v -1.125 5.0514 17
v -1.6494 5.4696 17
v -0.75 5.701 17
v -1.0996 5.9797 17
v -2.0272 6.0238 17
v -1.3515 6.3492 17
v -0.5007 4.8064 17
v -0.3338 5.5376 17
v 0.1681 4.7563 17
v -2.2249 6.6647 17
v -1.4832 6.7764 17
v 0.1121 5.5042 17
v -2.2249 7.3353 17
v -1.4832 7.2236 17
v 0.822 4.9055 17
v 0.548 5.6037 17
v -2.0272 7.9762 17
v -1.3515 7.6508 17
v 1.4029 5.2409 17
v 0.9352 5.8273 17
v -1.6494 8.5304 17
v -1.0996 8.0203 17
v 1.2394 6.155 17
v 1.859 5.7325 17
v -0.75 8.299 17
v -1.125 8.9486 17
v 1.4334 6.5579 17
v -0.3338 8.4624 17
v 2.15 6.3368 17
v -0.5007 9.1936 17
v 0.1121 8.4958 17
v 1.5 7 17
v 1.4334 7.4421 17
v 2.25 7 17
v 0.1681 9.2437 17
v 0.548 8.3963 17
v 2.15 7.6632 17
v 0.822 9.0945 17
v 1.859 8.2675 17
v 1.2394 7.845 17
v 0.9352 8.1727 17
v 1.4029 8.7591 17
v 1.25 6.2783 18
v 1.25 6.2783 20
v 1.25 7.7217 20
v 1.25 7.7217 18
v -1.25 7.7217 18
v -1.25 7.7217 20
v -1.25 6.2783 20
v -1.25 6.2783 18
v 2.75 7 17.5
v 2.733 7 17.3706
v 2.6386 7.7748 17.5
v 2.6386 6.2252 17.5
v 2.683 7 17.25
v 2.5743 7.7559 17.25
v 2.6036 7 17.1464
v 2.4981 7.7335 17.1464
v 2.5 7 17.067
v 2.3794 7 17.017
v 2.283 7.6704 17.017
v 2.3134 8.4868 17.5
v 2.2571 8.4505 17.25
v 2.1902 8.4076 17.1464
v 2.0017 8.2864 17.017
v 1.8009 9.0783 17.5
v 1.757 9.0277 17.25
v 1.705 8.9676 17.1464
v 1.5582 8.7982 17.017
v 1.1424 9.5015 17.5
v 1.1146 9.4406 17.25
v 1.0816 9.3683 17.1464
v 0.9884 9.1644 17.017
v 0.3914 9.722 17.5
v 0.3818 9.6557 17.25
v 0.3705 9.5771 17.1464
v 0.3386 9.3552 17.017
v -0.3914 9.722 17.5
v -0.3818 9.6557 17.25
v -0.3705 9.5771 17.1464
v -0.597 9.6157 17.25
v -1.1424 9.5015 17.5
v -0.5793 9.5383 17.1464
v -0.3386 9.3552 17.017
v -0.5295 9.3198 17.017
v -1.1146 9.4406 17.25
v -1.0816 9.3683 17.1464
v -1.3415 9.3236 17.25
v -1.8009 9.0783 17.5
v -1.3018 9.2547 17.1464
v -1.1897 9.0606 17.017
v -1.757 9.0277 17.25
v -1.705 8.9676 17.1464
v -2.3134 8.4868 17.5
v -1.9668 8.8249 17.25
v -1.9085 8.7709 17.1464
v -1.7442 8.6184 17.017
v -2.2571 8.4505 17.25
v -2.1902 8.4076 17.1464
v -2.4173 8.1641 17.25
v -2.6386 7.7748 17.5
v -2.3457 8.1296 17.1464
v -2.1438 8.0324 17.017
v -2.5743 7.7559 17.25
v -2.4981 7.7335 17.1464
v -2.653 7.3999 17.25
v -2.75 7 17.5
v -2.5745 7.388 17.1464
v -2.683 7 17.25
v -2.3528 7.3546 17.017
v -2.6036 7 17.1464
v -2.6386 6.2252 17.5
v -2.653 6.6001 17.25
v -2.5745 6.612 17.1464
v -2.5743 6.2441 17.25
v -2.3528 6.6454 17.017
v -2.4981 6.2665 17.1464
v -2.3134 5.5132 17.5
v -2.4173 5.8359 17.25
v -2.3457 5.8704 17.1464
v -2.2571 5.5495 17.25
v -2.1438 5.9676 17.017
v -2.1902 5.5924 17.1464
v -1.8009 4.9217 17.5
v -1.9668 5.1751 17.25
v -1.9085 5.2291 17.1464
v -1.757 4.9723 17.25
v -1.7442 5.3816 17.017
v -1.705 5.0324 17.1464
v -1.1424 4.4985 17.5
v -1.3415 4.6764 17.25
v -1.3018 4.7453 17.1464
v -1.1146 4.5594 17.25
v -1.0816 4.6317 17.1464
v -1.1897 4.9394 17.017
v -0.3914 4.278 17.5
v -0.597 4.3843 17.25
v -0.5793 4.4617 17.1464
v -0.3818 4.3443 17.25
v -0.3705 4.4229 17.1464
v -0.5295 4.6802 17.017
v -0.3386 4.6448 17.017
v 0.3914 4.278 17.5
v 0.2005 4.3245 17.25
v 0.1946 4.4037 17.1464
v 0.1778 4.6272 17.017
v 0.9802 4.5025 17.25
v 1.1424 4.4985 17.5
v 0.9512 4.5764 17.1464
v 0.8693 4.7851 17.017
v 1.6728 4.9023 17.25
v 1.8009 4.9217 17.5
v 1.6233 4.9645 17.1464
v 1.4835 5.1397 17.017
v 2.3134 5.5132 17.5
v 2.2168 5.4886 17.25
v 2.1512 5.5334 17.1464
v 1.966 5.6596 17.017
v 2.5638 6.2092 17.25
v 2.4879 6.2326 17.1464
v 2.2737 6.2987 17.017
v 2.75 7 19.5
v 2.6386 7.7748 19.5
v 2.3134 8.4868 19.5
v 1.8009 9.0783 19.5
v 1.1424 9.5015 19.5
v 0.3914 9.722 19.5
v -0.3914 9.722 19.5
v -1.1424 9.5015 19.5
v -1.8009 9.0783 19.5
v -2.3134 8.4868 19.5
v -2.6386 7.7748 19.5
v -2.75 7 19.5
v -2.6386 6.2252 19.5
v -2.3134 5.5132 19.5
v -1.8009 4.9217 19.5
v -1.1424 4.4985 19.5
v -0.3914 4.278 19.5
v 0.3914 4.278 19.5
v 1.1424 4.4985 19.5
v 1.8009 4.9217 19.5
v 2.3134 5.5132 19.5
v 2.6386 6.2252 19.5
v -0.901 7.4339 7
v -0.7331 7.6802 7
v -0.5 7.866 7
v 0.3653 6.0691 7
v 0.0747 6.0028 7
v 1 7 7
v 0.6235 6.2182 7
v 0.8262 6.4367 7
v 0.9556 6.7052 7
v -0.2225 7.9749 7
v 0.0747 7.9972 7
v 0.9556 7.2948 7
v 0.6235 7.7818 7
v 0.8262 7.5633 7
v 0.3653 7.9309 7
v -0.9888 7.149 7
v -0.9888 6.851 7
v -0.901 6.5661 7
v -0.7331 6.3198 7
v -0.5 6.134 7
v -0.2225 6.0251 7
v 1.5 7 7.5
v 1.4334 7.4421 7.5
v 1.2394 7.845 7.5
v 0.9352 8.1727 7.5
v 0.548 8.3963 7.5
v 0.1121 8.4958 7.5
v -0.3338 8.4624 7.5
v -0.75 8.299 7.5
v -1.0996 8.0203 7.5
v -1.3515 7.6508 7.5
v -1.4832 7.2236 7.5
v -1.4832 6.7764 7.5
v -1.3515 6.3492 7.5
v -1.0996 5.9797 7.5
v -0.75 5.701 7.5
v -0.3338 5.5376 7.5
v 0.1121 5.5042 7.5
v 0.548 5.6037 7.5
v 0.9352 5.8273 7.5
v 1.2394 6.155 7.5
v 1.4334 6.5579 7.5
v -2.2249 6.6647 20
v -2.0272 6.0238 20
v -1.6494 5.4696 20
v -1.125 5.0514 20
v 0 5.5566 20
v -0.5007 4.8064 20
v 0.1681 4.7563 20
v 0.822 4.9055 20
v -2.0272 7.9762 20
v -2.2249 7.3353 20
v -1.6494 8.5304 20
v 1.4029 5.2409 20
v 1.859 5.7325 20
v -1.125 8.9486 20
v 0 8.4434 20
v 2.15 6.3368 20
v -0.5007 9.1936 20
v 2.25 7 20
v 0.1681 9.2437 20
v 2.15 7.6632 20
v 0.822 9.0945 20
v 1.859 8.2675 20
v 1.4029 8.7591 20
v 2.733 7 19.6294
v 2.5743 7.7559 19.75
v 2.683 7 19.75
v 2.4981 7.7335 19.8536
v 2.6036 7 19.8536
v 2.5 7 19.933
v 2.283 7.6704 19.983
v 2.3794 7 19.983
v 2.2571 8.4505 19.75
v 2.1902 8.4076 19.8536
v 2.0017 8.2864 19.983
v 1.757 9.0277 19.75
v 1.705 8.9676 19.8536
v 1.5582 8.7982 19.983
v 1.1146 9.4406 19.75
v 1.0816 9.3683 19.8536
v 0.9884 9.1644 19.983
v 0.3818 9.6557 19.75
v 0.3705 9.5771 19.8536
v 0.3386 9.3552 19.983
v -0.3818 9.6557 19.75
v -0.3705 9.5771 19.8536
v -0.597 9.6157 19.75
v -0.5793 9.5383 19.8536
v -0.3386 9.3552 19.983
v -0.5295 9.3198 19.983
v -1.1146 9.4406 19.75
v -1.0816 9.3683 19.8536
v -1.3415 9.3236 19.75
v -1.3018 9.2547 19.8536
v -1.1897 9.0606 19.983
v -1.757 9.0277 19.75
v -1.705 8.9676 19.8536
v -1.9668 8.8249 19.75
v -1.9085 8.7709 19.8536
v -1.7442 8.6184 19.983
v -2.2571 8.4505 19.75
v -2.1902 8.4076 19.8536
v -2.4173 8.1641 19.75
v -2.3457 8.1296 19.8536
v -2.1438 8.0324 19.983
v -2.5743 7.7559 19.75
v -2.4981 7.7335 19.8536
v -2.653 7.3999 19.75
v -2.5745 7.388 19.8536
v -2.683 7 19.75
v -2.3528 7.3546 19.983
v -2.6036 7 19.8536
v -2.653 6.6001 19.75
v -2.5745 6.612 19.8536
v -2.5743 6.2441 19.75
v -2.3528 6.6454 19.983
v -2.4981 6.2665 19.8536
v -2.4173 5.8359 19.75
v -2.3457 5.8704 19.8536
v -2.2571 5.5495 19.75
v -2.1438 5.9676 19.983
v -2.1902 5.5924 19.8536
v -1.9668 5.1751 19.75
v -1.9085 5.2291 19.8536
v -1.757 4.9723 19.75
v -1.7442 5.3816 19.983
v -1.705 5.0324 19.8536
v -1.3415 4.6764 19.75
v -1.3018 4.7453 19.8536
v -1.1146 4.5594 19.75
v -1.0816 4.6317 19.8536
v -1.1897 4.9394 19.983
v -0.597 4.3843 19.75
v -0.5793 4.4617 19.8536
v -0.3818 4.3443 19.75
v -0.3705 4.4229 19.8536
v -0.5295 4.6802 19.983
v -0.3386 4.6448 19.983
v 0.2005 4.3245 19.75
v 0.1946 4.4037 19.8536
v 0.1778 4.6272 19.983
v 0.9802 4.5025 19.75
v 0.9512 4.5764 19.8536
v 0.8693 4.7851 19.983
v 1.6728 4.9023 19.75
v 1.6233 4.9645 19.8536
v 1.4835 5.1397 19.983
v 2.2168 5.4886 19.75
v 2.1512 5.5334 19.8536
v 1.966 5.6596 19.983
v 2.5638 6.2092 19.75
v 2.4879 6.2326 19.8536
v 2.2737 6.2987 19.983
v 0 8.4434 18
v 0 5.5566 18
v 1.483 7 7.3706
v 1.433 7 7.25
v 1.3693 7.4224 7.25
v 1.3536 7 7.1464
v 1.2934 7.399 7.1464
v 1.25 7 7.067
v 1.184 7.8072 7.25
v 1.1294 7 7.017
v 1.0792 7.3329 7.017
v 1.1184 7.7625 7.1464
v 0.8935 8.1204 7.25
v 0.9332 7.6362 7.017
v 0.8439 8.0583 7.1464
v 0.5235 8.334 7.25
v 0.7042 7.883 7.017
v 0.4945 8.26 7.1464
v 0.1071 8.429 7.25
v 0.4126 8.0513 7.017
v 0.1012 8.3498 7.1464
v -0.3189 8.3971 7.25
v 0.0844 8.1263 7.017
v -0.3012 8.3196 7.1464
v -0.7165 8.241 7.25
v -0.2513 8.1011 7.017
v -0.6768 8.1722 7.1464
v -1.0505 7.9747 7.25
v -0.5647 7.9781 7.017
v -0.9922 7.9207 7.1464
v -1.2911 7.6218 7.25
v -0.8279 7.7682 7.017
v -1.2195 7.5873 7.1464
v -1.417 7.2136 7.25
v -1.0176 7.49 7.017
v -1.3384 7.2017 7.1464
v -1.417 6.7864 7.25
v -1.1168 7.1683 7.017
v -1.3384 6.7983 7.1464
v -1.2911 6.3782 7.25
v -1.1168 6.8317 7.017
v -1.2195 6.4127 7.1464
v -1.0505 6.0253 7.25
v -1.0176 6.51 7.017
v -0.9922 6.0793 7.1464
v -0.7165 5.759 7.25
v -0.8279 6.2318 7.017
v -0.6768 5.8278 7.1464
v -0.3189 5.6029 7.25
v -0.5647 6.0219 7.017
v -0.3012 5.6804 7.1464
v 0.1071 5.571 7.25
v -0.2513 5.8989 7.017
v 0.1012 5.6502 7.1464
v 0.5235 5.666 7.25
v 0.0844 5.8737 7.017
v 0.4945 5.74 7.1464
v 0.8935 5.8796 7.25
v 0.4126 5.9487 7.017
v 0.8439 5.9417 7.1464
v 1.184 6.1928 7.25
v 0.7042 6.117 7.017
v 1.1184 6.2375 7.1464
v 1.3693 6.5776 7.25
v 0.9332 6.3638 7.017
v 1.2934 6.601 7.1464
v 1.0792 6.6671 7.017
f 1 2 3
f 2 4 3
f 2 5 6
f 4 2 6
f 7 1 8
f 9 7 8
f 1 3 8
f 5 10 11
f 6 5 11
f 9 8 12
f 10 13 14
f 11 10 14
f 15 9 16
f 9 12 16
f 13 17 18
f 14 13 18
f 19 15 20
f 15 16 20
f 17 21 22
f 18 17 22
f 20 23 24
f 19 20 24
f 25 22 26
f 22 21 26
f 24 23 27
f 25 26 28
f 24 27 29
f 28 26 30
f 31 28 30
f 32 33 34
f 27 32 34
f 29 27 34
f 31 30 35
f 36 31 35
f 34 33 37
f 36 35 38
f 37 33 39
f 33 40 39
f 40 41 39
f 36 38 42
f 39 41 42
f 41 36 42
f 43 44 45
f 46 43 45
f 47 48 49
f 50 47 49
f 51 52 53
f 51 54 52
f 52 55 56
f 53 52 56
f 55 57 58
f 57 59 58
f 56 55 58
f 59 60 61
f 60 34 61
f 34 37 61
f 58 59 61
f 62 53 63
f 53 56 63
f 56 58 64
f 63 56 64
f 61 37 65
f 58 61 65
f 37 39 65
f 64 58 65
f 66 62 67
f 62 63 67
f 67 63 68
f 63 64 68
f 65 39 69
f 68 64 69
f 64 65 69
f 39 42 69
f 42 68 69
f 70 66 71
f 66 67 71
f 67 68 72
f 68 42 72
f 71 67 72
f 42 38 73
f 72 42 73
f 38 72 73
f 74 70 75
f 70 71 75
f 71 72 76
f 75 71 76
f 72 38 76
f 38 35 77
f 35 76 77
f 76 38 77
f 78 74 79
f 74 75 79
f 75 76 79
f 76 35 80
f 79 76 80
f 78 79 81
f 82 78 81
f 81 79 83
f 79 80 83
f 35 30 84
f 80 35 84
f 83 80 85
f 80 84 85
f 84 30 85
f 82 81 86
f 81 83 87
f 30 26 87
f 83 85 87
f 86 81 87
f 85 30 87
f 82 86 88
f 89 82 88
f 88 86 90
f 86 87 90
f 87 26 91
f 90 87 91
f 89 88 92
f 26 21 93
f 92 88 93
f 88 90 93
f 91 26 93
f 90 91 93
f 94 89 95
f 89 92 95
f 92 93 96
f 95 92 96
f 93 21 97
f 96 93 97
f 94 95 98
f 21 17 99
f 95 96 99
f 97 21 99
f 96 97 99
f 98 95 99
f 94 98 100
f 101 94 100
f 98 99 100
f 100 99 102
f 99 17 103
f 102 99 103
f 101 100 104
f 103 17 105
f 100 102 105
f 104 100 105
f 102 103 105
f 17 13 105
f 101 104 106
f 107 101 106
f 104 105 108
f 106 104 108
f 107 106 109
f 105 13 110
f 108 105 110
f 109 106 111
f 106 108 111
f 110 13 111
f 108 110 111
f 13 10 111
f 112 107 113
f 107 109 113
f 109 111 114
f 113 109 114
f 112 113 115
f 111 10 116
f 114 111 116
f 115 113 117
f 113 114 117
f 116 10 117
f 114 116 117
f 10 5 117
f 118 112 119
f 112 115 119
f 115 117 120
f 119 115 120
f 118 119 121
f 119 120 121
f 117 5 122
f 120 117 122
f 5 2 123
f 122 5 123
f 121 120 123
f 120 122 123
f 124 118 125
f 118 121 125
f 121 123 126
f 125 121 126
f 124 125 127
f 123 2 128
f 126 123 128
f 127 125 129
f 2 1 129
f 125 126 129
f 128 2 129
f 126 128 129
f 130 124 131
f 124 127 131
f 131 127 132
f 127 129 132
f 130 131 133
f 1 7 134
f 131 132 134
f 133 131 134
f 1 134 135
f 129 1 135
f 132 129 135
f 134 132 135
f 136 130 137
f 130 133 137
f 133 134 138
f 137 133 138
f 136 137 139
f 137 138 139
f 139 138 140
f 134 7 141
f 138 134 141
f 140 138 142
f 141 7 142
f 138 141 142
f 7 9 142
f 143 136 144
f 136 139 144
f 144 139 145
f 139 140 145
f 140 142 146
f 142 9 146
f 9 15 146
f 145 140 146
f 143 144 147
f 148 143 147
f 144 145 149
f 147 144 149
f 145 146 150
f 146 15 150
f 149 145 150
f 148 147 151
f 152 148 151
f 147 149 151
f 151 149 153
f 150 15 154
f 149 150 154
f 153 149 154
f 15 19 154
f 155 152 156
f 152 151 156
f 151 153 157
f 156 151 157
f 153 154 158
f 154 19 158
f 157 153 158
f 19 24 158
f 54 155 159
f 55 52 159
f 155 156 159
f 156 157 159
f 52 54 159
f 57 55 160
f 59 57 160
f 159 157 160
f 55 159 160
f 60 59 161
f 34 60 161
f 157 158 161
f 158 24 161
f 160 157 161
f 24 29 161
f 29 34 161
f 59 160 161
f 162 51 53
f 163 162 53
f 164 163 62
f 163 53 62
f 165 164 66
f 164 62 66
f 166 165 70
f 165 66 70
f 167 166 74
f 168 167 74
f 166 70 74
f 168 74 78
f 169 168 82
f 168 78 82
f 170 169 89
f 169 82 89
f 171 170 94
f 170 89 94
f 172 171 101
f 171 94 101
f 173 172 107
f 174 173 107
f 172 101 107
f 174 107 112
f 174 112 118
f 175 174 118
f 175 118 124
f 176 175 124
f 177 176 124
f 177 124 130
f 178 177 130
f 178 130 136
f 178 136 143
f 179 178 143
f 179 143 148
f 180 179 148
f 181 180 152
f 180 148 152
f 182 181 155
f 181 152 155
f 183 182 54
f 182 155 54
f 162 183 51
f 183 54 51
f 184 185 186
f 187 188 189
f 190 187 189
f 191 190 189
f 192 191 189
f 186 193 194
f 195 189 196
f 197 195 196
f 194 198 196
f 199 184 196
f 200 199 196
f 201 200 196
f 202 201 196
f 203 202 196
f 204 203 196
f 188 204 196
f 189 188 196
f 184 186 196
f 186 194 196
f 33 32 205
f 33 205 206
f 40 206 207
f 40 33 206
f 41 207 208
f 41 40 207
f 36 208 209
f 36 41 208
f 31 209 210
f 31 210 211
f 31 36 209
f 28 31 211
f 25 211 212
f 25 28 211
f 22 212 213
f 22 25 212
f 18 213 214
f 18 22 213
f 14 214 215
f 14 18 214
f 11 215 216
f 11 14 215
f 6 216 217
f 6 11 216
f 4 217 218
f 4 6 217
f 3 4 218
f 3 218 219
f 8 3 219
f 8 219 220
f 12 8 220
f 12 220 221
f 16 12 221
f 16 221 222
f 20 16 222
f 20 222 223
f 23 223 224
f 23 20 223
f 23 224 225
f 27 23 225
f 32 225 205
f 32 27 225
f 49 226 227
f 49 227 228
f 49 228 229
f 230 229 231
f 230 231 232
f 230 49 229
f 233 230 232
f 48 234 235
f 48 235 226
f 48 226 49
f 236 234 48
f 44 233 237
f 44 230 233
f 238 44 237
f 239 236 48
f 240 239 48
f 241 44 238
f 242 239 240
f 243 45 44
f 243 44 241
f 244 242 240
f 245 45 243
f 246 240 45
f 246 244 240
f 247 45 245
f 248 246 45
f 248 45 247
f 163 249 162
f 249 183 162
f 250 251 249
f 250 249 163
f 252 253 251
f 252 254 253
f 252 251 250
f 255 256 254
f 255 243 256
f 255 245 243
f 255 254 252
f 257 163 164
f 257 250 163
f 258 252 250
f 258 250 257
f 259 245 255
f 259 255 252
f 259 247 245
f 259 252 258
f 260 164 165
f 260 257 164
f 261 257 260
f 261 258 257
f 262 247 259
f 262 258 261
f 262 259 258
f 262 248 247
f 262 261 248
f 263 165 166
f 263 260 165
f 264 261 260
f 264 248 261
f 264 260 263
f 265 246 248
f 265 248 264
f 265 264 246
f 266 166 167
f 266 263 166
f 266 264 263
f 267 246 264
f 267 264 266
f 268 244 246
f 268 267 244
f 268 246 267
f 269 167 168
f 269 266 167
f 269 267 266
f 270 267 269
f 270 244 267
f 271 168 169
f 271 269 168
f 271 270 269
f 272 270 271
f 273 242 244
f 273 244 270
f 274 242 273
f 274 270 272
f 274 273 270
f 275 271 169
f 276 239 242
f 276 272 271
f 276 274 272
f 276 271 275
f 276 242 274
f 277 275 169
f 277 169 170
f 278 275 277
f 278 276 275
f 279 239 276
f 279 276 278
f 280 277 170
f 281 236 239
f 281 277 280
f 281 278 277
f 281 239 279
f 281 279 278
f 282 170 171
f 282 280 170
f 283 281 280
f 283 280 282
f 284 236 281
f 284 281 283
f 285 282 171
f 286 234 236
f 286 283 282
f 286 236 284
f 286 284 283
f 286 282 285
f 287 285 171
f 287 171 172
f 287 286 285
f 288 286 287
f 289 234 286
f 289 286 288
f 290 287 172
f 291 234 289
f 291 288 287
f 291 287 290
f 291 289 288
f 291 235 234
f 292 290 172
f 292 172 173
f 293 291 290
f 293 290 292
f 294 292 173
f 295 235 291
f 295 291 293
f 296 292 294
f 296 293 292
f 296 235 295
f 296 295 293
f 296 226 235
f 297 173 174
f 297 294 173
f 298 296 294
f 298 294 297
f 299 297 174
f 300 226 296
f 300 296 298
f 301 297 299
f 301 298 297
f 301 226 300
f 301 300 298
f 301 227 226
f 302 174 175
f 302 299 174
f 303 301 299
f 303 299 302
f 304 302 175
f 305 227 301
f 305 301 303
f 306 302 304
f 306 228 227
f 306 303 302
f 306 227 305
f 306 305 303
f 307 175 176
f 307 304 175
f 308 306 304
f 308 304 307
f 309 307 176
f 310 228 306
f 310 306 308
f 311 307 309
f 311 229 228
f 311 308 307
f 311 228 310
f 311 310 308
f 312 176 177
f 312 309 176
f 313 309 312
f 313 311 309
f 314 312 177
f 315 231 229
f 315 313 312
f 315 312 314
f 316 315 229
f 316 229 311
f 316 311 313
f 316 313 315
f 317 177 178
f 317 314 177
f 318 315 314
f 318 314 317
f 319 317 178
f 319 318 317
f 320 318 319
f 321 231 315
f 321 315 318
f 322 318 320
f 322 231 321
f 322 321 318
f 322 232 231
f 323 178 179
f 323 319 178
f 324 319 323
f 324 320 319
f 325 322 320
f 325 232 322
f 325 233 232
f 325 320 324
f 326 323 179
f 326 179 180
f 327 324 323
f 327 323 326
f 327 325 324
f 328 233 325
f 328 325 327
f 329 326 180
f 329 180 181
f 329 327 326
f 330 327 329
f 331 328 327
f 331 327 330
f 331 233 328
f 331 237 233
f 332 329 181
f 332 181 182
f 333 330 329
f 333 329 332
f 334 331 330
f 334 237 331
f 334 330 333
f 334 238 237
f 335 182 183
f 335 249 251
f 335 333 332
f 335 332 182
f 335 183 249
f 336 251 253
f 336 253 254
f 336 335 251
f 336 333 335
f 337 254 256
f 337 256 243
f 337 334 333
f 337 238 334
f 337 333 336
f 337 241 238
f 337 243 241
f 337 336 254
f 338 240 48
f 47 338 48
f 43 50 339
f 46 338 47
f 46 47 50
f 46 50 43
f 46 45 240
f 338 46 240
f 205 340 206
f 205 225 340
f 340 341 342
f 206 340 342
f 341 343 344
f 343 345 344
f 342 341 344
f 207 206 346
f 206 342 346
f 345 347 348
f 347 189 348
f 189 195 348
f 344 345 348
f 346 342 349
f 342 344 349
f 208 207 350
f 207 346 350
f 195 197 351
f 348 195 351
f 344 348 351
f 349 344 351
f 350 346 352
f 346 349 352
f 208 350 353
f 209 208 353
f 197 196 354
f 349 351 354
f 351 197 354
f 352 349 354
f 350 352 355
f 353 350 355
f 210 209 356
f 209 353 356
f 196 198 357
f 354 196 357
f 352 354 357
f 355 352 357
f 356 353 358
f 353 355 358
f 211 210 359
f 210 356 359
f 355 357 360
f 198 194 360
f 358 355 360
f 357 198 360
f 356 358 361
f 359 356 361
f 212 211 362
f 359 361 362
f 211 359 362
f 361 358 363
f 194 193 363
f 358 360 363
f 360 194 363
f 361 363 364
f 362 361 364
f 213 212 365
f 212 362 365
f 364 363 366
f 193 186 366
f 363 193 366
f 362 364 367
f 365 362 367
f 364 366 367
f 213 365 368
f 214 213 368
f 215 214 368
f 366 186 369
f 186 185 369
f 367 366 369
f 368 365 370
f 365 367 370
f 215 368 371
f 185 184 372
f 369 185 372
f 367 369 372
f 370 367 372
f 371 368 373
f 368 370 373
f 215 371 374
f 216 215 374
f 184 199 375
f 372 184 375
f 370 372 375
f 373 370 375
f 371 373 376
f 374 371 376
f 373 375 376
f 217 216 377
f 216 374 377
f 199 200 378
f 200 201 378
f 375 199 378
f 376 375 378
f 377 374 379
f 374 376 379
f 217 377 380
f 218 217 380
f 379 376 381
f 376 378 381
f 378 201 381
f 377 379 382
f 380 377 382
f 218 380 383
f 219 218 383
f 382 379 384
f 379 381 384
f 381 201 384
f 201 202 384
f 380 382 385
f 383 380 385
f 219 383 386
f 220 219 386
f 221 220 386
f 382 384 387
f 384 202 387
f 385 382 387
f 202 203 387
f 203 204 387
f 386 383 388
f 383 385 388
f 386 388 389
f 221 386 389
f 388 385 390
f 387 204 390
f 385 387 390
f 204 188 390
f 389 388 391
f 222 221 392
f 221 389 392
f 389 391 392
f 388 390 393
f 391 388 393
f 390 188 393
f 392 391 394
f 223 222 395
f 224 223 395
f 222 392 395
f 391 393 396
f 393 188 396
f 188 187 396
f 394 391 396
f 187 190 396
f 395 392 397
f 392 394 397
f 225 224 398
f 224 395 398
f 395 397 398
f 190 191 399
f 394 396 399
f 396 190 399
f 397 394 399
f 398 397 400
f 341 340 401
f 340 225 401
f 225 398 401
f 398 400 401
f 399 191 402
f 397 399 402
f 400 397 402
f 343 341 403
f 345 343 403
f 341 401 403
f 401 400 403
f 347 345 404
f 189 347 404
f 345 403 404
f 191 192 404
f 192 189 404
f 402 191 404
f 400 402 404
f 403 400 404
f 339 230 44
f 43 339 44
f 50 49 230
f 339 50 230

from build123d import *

# Parameters (mm, degrees)
SKETCH011_R     = 2.75
PAD006_DEPTH    = 3
POCKET004_DEPTH = 2
SKETCH013_R     = 1.5
PAD007_DEPTH    = 10
FILLET003_R     = 0.5


with BuildPart() as part:
    # Sketch011 → Pad006 (new body)
    with BuildSketch(Plane.XY):
        Circle(SKETCH011_R)
    extrude(amount=PAD006_DEPTH)

    # Sketch012 (on Face3 of Pad006) → Pocket004 (cut)
    with BuildSketch(Plane.XY.offset(3)):
        Polygon((1.25, -0.721688), (1.25, 0.721688), (0, 1.443376), (-1.25, 0.721688), (-1.25, -0.721688), (0, -1.443376), align=None)
    extrude(amount=-POCKET004_DEPTH, mode=Mode.SUBTRACT)

    # Sketch013 → Pad007 (join)
    with BuildSketch(Plane.XY):
        Circle(SKETCH013_R)
    extrude(amount=-PAD007_DEPTH)

    # Fillet003
    fillet003_edges = [part.edges().sort_by_distance(p)[0] for p in [
        (-2.75, 0, 3),
        (-2.75, 0, 0),
        (-1.5, 0, -10),
    ]]
    fillet(fillet003_edges, radius=FILLET003_R)


with BuildPart() as part_1:
    # Body004 placement: moved
    add(part.part.moved(Location((0, -7, 17))))


with BuildPart() as part_2:
    # Clone placement: moved
    add(part_1.part.moved(Location((0, 14, 0))))


solid = part_2.part
